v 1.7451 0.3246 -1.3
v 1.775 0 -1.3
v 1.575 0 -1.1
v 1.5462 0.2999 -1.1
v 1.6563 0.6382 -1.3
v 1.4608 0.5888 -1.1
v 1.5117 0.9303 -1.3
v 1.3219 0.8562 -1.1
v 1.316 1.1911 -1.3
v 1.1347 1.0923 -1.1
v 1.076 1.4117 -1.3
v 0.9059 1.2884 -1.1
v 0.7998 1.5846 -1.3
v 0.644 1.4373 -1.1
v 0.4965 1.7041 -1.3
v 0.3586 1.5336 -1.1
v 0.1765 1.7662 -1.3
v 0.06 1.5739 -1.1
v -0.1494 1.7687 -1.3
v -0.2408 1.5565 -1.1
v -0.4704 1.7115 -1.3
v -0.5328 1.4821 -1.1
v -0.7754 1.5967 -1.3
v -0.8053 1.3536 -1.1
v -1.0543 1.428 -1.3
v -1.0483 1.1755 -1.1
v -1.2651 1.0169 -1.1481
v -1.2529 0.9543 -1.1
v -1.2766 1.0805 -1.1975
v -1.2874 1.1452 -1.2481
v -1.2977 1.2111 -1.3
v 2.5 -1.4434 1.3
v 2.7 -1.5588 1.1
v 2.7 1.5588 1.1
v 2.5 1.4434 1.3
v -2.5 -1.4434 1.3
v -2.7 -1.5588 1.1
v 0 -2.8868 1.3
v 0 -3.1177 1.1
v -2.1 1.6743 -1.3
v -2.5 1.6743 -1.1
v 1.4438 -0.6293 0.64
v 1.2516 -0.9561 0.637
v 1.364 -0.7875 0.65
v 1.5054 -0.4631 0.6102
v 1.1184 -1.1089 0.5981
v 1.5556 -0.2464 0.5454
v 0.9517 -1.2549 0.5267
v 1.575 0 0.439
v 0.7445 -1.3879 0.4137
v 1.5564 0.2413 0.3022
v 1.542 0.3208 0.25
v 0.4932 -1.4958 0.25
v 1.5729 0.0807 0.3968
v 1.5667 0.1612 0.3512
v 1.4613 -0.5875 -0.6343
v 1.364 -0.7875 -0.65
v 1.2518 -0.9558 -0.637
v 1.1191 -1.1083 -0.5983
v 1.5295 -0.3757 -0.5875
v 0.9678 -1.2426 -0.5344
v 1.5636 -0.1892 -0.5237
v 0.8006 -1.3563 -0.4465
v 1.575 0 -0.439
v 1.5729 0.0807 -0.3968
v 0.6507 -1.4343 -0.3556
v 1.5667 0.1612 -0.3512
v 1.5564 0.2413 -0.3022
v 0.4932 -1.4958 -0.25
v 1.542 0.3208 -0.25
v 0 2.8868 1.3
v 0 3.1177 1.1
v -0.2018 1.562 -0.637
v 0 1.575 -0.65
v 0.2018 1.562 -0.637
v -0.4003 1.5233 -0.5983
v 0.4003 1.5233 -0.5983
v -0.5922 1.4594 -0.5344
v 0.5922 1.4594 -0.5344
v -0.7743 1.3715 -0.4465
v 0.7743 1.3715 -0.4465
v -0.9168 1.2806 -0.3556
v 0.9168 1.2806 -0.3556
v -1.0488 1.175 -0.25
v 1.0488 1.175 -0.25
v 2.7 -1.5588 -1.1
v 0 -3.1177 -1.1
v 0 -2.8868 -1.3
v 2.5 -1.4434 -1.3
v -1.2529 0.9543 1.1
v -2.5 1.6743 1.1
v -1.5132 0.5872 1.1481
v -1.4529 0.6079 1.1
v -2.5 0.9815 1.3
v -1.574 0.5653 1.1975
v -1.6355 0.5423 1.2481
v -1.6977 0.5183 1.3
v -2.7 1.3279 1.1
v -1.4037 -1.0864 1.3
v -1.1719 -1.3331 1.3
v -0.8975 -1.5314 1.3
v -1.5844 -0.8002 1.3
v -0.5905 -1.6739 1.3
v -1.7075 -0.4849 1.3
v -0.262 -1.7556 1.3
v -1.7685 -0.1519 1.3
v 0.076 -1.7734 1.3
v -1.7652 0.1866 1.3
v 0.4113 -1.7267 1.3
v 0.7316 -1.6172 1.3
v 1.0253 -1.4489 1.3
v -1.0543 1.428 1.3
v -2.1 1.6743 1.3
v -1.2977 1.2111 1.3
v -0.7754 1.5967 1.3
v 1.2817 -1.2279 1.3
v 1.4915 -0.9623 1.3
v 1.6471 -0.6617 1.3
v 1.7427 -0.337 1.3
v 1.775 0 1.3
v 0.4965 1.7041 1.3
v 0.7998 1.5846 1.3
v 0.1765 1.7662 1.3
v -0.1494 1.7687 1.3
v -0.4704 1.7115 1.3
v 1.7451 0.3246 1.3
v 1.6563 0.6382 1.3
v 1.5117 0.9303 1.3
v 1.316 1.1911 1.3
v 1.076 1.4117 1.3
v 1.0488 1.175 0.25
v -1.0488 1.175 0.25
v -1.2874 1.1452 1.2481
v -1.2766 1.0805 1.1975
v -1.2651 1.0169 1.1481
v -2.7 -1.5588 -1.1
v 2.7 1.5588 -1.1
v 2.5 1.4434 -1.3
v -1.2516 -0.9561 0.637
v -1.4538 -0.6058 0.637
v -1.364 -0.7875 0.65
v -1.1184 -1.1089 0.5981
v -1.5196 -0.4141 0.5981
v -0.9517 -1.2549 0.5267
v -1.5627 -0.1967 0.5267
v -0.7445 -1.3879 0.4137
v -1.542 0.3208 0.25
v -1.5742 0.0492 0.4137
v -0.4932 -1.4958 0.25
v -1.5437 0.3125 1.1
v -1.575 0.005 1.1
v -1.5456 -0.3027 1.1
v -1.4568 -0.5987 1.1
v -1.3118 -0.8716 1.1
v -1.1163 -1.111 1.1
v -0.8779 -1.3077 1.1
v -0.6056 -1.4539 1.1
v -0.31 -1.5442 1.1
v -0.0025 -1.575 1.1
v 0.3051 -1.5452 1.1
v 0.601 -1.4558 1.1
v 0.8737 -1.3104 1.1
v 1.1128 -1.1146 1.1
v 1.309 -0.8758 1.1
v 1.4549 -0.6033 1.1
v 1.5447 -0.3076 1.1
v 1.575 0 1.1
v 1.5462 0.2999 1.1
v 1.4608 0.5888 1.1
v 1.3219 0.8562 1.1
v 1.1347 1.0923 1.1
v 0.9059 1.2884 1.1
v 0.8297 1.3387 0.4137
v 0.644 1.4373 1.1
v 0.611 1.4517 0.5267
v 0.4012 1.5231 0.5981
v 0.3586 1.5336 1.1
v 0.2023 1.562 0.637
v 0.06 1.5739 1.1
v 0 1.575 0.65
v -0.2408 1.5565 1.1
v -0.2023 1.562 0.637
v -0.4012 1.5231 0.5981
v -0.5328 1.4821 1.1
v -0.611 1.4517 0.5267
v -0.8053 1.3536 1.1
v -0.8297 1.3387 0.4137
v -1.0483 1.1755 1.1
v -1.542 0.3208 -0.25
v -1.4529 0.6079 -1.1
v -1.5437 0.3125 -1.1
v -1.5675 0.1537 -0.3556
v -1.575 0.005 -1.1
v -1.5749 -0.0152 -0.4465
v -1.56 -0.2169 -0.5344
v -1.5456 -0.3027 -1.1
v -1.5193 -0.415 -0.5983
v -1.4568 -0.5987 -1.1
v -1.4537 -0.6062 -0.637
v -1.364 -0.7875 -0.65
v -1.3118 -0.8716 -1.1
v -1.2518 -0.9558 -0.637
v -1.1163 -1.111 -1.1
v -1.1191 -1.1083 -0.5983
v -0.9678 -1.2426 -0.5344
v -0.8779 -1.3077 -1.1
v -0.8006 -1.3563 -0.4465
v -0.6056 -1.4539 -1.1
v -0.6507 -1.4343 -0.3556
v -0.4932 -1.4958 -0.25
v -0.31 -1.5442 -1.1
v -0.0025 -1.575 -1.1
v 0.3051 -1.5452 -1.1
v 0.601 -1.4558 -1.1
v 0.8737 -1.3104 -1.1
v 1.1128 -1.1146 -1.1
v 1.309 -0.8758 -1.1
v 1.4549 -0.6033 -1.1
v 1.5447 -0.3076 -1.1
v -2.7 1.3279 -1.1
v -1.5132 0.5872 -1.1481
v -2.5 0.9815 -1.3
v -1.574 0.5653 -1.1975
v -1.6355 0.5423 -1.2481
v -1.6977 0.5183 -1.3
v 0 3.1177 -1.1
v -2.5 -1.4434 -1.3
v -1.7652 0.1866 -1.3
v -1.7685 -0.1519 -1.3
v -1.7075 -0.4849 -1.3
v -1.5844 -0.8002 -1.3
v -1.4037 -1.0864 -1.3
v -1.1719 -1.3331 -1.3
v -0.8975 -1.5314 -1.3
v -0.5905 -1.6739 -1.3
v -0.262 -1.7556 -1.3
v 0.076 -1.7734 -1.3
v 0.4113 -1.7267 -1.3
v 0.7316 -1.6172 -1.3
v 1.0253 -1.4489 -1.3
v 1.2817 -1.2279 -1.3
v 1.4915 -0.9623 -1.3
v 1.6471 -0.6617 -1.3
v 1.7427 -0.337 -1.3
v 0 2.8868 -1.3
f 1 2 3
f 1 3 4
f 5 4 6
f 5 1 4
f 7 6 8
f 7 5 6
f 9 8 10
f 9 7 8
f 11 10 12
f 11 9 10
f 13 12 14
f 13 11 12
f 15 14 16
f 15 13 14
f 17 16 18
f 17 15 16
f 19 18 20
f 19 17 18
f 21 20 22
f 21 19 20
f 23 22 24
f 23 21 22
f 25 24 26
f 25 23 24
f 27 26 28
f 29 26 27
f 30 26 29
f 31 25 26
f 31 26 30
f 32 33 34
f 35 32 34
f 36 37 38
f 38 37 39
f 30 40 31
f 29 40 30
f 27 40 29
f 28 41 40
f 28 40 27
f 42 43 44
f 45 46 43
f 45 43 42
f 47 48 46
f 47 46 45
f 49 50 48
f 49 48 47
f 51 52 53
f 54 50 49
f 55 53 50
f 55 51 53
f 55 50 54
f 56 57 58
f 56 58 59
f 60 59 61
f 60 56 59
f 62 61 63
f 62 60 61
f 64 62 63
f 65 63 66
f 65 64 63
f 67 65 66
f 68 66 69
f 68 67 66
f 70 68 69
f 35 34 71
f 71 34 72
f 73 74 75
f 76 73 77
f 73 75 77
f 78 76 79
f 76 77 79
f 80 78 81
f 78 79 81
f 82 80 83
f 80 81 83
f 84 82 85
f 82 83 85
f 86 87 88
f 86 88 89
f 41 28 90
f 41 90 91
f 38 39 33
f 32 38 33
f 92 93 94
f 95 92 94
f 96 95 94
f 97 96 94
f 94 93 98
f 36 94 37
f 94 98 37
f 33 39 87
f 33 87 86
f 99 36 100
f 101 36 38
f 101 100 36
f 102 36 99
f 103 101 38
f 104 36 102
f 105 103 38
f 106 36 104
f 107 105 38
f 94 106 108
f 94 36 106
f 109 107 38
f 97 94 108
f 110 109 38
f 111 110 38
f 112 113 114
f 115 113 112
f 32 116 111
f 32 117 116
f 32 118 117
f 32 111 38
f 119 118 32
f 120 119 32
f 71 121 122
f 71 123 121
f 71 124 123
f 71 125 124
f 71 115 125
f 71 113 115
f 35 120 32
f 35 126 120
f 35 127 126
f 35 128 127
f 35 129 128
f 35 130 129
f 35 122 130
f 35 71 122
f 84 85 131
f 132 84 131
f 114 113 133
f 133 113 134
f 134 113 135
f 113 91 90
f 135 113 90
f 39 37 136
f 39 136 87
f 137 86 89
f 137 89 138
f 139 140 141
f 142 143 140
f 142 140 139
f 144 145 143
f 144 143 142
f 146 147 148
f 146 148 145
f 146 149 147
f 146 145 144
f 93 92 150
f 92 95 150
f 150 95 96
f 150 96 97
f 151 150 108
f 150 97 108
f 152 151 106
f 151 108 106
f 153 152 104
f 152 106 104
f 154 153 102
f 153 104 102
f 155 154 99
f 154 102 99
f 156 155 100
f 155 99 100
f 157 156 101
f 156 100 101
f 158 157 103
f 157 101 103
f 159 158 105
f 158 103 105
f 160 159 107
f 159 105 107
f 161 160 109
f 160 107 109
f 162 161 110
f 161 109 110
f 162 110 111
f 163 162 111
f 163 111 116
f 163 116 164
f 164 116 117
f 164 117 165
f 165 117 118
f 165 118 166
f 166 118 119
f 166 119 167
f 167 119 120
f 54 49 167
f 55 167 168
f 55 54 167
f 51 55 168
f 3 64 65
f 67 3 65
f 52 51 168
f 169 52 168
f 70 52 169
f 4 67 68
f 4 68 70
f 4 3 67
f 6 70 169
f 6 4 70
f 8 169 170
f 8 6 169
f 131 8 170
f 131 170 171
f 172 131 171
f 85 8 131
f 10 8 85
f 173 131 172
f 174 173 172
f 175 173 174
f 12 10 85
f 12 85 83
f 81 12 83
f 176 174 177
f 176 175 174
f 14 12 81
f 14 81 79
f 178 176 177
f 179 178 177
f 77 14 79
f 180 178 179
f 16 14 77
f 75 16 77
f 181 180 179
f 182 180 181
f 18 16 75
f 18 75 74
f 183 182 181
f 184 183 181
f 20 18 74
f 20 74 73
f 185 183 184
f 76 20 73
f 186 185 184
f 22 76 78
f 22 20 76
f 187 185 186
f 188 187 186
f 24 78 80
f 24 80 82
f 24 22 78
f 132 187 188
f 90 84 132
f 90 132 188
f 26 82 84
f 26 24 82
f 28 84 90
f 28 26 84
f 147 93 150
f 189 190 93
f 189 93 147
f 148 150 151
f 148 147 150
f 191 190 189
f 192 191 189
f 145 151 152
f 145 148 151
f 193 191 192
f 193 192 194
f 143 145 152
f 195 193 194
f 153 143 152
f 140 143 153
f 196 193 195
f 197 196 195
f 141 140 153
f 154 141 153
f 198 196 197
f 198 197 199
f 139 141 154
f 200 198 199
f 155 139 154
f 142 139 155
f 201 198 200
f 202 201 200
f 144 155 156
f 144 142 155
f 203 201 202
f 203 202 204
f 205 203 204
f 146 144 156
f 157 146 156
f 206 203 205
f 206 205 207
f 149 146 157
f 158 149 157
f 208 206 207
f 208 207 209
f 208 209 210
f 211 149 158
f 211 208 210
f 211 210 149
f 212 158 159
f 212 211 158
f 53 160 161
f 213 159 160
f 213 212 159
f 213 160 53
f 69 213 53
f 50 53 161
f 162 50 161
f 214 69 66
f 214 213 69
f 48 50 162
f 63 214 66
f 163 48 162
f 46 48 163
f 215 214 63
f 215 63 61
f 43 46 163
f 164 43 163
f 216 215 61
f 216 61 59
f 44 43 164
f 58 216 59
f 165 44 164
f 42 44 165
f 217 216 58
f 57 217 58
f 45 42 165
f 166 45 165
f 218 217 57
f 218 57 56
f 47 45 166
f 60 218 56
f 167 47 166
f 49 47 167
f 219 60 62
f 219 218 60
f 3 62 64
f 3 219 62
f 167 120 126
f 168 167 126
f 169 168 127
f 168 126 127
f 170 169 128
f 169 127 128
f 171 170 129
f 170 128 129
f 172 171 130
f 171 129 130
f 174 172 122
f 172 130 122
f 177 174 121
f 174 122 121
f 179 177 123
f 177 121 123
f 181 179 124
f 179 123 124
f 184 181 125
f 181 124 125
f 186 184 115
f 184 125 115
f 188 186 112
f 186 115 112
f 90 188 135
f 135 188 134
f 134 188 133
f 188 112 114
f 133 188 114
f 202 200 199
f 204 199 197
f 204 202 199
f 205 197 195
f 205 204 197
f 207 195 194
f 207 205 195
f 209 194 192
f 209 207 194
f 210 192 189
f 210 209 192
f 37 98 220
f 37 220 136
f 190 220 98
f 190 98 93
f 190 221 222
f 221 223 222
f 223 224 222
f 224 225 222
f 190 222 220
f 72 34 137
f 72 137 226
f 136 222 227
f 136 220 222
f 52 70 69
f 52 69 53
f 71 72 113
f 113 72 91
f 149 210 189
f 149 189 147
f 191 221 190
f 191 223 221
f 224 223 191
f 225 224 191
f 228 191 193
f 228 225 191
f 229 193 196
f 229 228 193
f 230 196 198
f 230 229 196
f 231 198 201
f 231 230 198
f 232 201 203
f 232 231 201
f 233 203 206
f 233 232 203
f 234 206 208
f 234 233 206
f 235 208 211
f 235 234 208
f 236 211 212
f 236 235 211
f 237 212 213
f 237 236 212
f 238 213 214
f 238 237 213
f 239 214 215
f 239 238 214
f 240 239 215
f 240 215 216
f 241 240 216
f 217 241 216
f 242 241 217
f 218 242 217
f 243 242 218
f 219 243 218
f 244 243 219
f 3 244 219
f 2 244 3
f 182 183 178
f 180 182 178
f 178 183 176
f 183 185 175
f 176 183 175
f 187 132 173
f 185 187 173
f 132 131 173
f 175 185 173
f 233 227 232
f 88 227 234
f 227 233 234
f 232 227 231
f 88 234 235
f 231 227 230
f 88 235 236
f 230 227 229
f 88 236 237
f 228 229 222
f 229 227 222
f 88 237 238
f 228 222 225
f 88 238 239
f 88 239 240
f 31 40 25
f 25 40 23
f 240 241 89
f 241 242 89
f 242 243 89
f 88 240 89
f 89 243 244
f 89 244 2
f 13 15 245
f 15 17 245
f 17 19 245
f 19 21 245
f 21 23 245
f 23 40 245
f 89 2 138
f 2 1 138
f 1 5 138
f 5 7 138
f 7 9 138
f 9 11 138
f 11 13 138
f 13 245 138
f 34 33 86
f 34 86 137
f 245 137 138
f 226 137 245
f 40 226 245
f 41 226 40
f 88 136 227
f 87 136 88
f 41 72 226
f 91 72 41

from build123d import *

# Parameters (mm, degrees)
SKETCH1_R                   = 1.575
BOSS_EXTRUDE1_DEPTH         = 1.3
CLIP_REACH                  = 6.324
CLIP_END_RADIUS             = 1.575
CLIP_DIRECTION_2_REACH      = 6.324
CLIP_DIRECTION_2_END_RADIUS = 1.575
CLIPS_X3_COUNT              = 3
SPLIT_2_DEPTH               = 5.324349662
SPLIT_2_DEPTH_BACK          = 5.324349662
DEBURS_SIZE                 = 0.2


with BuildPart() as part:
    # Sketch1 → Boss-Extrude1 (new, symmetric)
    with BuildSketch(Plane.XY):
        Polygon((2.7, -1.558845727), (2.7, 1.558845727), (0, 3.117691454), (-2.7, 1.558845727), (-2.7, -1.558845727), (0, -3.117691454), align=None)
        Circle(SKETCH1_R, mode=Mode.SUBTRACT)
    extrude(amount=BOSS_EXTRUDE1_DEPTH, both=True)

    # Clip: up to this cylinder (the profile starts inside it)
    clip_end = Plane(origin=(0, 0, 0), z_dir=(0, 0, -1)) * Cylinder(CLIP_END_RADIUS, 16.798, mode=Mode.PRIVATE)
    # Sketch3 → Clip (add, up to the surface)
    with BuildSketch(Plane(origin=(0, 0, 0), x_dir=(0, 0, -1), z_dir=(1, 0, 0)), mode=Mode.PRIVATE) as clip_sk1:
        Polygon((-0.65, 1.575), (0.65, 1.575), (0.25, 1.175), (-0.25, 1.175), align=None)
    clip_tool1 = extrude(clip_sk1.sketch, amount=CLIP_REACH, mode=Mode.PRIVATE) & clip_end
    clip = clip_tool1.solids().sort_by_distance((0, 1.40463, 0))[0]
    add(clip)

    # Clip direction 2: up to this cylinder (the profile starts inside it)
    clip_direction_2_end = Plane(origin=(0, 0, 0), z_dir=(0, 0, -1)) * Cylinder(CLIP_DIRECTION_2_END_RADIUS, 16.798, mode=Mode.PRIVATE)
    # Sketch3 → Clip direction 2 (add, up to the surface)
    with BuildSketch(Plane(origin=(0, 0, 0), x_dir=(0, 0, -1), z_dir=(1, 0, 0)), mode=Mode.PRIVATE) as clip_direction_2_sk1:
        Polygon((-0.65, 1.575), (0.65, 1.575), (0.25, 1.175), (-0.25, 1.175), align=None)
    clip_direction_2_tool1 = extrude(clip_direction_2_sk1.sketch, amount=-CLIP_DIRECTION_2_REACH, mode=Mode.PRIVATE) & clip_direction_2_end
    clip_direction_2 = clip_direction_2_tool1.solids().sort_by_distance((0, 1.40463, 0))[0]
    add(clip_direction_2)
    clip = clip + clip_direction_2  # both directions under the feature's name, for the pattern or mirror that repeats it

    # Clips x3: Clip ×3 about axis
    clips_x3_axis = Axis((0, 0, 0), (0, 0, 1))
    for i in range(1, CLIPS_X3_COUNT):
        add(clip.rotate(clips_x3_axis, i * 360 / CLIPS_X3_COUNT))

    # Sketch4 → Split 2 (cut, two sides: drawn at the far end of the back side and taken through both)
    with BuildSketch(Plane.XY.offset(-SPLIT_2_DEPTH_BACK)):
        Polygon((-2.8, 1.385640646), (-0.1, -0.173205081), (0.1, 0.173205081), (-2.6, 1.732050808), align=None)
    extrude(amount=SPLIT_2_DEPTH + SPLIT_2_DEPTH_BACK, mode=Mode.SUBTRACT)

    # Deburs
    deburs_edges = [part.edges().sort_by_distance(p)[0] for p in [
        (1.35, 2.33826859, 1.3),
        (-1.25, 2.396003617, 1.3),
        (-1.35, -2.33826859, 1.3),
        (-0.310025509, -1.544185605, 1.3),
        (1.35, -2.33826859, 1.3),
        (-0.310025509, -1.544185605, -1.3),
        (-2.7, -0.115470054, -1.3),
        (-2.7, -0.115470054, 1.3),
        (-2.076474085, 0.967912764, -1.3),
        (-1.876474085, 1.314322926, 1.3),
        (-1.876474085, 1.314322926, -1.3),
        (-2.076474085, 0.967912764, 1.3),
        (-1.35, -2.33826859, -1.3),
        (-1.25, 2.396003617, -1.3),
        (1.35, 2.33826859, -1.3),
        (2.7, 0, -1.3),
        (1.35, -2.33826859, -1.3),
        (2.7, 0, 1.3),
    ]]
    chamfer(deburs_edges, length=DEBURS_SIZE)


solid = part.part
